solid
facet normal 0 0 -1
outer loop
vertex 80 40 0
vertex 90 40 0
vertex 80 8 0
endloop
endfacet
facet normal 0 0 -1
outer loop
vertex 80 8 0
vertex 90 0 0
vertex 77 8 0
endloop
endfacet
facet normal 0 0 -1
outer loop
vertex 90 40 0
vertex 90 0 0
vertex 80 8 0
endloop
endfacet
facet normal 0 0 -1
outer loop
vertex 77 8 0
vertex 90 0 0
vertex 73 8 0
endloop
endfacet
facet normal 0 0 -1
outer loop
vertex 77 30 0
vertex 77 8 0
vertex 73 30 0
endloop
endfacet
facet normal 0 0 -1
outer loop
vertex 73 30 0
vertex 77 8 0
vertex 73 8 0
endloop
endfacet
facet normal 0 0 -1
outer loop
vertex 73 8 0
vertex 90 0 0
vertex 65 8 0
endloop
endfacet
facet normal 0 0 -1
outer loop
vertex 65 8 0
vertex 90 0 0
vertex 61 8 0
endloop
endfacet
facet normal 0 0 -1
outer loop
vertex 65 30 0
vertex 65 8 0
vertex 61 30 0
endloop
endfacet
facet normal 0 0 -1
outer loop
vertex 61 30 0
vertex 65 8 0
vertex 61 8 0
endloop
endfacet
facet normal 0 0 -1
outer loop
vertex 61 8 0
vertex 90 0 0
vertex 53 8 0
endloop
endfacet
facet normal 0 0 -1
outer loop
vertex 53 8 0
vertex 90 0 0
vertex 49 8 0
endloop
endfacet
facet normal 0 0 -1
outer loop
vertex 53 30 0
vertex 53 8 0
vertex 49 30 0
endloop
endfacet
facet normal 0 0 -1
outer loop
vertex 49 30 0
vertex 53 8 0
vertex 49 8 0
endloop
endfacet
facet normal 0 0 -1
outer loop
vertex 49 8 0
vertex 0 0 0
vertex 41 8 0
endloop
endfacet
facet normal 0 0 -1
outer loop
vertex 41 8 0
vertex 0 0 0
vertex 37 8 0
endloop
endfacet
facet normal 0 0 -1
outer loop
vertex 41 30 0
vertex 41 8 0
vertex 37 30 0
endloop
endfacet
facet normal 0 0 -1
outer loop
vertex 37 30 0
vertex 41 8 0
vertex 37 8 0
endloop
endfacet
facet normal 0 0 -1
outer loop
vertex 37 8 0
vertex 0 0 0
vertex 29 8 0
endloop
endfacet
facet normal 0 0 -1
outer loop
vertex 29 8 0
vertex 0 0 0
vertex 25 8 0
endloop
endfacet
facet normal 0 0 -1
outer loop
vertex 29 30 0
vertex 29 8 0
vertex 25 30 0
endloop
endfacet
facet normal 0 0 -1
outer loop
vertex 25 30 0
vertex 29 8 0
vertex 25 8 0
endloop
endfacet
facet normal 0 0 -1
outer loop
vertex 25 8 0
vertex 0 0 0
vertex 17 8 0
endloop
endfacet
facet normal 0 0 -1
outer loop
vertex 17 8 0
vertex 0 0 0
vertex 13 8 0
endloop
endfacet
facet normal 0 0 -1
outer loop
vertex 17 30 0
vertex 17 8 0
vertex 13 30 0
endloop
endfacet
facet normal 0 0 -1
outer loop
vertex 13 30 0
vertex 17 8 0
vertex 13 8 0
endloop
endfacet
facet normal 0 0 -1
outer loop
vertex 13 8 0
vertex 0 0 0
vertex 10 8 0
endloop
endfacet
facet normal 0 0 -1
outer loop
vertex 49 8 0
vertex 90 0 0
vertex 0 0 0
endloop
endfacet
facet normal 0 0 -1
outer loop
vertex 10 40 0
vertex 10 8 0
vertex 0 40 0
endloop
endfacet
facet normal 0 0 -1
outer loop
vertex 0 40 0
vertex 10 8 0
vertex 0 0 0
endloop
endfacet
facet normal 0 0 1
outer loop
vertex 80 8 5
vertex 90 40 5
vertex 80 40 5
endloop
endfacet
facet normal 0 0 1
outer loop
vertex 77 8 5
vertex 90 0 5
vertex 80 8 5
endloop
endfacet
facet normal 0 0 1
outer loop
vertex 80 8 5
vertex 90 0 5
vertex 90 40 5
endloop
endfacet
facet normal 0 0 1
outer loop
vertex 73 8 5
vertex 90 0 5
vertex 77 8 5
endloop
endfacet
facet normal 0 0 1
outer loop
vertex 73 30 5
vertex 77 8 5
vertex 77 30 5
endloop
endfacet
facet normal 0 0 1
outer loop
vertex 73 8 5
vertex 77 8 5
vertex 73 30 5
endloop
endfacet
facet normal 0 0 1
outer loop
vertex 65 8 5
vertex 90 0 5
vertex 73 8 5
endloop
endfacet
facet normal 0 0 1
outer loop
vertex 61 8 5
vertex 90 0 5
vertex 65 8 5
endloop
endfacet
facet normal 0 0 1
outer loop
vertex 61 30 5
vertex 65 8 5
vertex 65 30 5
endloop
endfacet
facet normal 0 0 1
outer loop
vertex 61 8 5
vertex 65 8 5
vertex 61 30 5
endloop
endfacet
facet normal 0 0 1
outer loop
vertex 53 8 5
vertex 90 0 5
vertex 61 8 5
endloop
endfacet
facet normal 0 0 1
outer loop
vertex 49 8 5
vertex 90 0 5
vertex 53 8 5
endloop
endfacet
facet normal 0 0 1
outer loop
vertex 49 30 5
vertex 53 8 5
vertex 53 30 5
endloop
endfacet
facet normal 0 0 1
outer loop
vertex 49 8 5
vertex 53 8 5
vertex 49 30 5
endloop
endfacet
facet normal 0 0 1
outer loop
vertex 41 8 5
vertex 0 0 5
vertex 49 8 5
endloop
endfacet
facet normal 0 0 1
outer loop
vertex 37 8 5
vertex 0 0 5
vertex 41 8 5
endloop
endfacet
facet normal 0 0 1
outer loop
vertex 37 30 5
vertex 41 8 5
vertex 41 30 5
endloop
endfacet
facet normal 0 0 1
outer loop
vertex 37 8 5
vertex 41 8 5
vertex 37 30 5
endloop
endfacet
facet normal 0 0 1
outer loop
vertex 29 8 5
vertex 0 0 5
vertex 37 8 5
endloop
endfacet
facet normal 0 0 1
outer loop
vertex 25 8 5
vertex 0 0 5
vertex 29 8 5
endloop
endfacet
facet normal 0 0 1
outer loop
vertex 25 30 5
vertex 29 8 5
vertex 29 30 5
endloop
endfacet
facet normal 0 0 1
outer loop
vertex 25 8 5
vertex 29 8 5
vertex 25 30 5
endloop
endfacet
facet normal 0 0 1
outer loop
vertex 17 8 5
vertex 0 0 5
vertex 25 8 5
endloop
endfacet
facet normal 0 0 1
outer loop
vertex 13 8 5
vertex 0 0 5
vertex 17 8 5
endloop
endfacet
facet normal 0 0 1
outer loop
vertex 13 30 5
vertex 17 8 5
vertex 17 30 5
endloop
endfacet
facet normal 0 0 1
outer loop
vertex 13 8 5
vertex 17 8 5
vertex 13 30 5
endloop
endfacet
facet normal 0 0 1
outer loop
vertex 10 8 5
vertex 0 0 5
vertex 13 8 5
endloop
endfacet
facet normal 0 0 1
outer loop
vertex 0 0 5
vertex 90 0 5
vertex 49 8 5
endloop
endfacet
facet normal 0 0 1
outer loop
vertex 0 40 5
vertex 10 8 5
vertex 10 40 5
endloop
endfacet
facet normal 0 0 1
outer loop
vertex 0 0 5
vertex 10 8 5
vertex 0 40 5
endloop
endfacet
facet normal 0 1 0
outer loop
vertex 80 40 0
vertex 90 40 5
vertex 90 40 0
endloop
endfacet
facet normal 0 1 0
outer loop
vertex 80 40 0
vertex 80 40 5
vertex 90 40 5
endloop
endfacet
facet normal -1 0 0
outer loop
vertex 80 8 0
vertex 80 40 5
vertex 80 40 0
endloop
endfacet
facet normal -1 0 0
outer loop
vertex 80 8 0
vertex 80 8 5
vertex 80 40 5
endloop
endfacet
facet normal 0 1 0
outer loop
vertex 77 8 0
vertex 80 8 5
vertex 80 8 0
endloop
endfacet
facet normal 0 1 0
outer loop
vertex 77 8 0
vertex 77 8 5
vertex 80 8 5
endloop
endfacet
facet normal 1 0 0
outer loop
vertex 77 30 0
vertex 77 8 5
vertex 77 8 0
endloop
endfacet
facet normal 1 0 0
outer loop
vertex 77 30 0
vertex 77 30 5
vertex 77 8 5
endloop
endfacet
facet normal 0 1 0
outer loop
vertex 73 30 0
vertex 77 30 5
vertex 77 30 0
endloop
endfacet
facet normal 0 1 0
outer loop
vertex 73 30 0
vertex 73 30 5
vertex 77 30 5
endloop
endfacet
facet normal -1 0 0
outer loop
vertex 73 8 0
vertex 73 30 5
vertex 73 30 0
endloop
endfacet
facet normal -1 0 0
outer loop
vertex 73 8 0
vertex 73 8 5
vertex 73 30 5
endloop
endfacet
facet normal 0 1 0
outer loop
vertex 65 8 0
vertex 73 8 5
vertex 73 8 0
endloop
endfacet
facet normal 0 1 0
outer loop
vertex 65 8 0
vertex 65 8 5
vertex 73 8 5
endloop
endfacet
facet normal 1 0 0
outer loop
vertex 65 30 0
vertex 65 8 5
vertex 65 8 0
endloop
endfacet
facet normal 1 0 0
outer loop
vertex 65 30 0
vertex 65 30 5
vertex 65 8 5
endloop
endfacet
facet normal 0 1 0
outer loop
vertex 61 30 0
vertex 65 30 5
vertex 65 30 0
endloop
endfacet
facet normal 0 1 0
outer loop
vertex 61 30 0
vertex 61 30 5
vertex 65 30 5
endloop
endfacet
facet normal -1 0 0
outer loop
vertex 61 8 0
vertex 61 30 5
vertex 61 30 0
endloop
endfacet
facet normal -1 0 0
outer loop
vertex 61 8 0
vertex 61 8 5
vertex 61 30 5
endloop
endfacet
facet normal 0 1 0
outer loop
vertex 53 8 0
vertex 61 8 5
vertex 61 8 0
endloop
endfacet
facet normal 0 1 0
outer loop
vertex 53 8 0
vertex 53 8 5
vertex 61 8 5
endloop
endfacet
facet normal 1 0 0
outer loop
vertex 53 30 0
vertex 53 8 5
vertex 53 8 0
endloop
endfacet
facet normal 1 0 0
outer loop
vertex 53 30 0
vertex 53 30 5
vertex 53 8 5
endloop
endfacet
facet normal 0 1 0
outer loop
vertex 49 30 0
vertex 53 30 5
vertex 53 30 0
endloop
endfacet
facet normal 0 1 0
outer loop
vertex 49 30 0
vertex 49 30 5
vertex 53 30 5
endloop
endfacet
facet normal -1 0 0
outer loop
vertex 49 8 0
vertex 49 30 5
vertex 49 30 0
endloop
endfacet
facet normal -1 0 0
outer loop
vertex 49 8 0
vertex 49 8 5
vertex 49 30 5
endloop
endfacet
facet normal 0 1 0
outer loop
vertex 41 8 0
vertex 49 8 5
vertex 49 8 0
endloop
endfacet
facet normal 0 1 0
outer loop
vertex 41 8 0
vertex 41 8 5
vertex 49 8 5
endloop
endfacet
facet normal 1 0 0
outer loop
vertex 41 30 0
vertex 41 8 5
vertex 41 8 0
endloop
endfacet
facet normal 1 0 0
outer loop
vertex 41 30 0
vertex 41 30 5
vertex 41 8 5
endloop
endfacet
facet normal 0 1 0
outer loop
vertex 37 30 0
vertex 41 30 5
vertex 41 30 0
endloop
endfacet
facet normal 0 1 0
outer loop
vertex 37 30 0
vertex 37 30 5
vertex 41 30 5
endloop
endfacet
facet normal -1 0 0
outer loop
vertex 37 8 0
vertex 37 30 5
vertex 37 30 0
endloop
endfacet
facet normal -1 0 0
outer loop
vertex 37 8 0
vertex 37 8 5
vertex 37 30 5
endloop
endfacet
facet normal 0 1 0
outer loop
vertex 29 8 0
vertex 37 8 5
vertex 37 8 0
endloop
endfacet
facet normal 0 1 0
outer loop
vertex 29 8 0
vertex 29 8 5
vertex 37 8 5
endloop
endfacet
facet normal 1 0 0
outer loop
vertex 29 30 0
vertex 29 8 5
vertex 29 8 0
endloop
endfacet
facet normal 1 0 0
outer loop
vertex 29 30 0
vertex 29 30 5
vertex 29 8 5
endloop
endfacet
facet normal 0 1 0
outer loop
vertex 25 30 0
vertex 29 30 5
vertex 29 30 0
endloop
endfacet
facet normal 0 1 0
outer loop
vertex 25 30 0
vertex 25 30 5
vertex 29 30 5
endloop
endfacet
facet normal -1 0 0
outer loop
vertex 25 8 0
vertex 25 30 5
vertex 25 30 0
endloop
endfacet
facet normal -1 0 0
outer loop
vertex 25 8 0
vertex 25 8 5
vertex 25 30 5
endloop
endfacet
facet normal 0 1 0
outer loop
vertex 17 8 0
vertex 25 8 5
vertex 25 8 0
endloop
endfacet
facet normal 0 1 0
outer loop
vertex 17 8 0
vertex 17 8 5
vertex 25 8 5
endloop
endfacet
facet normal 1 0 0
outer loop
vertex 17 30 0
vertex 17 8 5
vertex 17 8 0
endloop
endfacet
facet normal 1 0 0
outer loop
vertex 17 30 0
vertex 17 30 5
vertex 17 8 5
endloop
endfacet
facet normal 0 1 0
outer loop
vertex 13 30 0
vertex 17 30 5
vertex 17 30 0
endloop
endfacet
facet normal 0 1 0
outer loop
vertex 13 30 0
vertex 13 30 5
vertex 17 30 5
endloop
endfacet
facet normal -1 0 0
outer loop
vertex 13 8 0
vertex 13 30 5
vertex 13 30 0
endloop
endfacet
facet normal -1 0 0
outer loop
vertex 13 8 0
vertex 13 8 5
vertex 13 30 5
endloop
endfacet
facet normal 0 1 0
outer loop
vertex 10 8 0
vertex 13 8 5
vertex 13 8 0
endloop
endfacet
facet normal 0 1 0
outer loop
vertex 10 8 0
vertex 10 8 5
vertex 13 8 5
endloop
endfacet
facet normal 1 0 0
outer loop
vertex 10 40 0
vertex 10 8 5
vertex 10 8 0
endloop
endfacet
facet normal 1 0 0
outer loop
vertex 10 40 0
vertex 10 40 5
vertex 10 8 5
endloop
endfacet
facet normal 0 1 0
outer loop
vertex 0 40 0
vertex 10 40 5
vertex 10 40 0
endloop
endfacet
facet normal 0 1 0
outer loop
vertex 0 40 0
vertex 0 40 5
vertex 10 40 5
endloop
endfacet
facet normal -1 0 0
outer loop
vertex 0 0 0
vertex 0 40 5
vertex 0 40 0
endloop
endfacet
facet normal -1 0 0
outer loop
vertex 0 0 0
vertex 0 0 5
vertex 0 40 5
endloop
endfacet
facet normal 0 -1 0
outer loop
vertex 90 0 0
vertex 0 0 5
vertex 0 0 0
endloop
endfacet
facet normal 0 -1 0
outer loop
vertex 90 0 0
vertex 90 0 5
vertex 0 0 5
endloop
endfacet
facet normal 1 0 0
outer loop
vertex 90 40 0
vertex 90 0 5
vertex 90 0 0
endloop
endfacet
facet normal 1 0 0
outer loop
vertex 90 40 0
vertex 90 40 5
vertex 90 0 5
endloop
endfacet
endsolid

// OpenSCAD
$fn = 32;

// ----------------------------------------------------------------------
// Guard grille: 6 slats over a 90 x 40 mm plate
// ----------------------------------------------------------------------

// --- parameters (mm) ---
profile_height = 5;       // extrusion height
profile_points = 32;      // points of the closed outline

profile = [[0, 0], [90, 0], [90, 40], [80, 40], [80, 8], [77, 8], [77, 30], [73, 30], [73, 8], [65, 8], [65, 30], [61, 30], [61, 8], [53, 8], [53, 30], [49, 30], [49, 8], [41, 8], [41, 30], [37, 30], [37, 8], [29, 8], [29, 30], [25, 30], [25, 8], [17, 8], [17, 30], [13, 30], [13, 8], [10, 8], [10, 40], [0, 40]];  // single closed polygon, 32 points, counter clockwise

// --- the one profile operation ---
linear_extrude(height = profile_height) polygon(points = profile);
